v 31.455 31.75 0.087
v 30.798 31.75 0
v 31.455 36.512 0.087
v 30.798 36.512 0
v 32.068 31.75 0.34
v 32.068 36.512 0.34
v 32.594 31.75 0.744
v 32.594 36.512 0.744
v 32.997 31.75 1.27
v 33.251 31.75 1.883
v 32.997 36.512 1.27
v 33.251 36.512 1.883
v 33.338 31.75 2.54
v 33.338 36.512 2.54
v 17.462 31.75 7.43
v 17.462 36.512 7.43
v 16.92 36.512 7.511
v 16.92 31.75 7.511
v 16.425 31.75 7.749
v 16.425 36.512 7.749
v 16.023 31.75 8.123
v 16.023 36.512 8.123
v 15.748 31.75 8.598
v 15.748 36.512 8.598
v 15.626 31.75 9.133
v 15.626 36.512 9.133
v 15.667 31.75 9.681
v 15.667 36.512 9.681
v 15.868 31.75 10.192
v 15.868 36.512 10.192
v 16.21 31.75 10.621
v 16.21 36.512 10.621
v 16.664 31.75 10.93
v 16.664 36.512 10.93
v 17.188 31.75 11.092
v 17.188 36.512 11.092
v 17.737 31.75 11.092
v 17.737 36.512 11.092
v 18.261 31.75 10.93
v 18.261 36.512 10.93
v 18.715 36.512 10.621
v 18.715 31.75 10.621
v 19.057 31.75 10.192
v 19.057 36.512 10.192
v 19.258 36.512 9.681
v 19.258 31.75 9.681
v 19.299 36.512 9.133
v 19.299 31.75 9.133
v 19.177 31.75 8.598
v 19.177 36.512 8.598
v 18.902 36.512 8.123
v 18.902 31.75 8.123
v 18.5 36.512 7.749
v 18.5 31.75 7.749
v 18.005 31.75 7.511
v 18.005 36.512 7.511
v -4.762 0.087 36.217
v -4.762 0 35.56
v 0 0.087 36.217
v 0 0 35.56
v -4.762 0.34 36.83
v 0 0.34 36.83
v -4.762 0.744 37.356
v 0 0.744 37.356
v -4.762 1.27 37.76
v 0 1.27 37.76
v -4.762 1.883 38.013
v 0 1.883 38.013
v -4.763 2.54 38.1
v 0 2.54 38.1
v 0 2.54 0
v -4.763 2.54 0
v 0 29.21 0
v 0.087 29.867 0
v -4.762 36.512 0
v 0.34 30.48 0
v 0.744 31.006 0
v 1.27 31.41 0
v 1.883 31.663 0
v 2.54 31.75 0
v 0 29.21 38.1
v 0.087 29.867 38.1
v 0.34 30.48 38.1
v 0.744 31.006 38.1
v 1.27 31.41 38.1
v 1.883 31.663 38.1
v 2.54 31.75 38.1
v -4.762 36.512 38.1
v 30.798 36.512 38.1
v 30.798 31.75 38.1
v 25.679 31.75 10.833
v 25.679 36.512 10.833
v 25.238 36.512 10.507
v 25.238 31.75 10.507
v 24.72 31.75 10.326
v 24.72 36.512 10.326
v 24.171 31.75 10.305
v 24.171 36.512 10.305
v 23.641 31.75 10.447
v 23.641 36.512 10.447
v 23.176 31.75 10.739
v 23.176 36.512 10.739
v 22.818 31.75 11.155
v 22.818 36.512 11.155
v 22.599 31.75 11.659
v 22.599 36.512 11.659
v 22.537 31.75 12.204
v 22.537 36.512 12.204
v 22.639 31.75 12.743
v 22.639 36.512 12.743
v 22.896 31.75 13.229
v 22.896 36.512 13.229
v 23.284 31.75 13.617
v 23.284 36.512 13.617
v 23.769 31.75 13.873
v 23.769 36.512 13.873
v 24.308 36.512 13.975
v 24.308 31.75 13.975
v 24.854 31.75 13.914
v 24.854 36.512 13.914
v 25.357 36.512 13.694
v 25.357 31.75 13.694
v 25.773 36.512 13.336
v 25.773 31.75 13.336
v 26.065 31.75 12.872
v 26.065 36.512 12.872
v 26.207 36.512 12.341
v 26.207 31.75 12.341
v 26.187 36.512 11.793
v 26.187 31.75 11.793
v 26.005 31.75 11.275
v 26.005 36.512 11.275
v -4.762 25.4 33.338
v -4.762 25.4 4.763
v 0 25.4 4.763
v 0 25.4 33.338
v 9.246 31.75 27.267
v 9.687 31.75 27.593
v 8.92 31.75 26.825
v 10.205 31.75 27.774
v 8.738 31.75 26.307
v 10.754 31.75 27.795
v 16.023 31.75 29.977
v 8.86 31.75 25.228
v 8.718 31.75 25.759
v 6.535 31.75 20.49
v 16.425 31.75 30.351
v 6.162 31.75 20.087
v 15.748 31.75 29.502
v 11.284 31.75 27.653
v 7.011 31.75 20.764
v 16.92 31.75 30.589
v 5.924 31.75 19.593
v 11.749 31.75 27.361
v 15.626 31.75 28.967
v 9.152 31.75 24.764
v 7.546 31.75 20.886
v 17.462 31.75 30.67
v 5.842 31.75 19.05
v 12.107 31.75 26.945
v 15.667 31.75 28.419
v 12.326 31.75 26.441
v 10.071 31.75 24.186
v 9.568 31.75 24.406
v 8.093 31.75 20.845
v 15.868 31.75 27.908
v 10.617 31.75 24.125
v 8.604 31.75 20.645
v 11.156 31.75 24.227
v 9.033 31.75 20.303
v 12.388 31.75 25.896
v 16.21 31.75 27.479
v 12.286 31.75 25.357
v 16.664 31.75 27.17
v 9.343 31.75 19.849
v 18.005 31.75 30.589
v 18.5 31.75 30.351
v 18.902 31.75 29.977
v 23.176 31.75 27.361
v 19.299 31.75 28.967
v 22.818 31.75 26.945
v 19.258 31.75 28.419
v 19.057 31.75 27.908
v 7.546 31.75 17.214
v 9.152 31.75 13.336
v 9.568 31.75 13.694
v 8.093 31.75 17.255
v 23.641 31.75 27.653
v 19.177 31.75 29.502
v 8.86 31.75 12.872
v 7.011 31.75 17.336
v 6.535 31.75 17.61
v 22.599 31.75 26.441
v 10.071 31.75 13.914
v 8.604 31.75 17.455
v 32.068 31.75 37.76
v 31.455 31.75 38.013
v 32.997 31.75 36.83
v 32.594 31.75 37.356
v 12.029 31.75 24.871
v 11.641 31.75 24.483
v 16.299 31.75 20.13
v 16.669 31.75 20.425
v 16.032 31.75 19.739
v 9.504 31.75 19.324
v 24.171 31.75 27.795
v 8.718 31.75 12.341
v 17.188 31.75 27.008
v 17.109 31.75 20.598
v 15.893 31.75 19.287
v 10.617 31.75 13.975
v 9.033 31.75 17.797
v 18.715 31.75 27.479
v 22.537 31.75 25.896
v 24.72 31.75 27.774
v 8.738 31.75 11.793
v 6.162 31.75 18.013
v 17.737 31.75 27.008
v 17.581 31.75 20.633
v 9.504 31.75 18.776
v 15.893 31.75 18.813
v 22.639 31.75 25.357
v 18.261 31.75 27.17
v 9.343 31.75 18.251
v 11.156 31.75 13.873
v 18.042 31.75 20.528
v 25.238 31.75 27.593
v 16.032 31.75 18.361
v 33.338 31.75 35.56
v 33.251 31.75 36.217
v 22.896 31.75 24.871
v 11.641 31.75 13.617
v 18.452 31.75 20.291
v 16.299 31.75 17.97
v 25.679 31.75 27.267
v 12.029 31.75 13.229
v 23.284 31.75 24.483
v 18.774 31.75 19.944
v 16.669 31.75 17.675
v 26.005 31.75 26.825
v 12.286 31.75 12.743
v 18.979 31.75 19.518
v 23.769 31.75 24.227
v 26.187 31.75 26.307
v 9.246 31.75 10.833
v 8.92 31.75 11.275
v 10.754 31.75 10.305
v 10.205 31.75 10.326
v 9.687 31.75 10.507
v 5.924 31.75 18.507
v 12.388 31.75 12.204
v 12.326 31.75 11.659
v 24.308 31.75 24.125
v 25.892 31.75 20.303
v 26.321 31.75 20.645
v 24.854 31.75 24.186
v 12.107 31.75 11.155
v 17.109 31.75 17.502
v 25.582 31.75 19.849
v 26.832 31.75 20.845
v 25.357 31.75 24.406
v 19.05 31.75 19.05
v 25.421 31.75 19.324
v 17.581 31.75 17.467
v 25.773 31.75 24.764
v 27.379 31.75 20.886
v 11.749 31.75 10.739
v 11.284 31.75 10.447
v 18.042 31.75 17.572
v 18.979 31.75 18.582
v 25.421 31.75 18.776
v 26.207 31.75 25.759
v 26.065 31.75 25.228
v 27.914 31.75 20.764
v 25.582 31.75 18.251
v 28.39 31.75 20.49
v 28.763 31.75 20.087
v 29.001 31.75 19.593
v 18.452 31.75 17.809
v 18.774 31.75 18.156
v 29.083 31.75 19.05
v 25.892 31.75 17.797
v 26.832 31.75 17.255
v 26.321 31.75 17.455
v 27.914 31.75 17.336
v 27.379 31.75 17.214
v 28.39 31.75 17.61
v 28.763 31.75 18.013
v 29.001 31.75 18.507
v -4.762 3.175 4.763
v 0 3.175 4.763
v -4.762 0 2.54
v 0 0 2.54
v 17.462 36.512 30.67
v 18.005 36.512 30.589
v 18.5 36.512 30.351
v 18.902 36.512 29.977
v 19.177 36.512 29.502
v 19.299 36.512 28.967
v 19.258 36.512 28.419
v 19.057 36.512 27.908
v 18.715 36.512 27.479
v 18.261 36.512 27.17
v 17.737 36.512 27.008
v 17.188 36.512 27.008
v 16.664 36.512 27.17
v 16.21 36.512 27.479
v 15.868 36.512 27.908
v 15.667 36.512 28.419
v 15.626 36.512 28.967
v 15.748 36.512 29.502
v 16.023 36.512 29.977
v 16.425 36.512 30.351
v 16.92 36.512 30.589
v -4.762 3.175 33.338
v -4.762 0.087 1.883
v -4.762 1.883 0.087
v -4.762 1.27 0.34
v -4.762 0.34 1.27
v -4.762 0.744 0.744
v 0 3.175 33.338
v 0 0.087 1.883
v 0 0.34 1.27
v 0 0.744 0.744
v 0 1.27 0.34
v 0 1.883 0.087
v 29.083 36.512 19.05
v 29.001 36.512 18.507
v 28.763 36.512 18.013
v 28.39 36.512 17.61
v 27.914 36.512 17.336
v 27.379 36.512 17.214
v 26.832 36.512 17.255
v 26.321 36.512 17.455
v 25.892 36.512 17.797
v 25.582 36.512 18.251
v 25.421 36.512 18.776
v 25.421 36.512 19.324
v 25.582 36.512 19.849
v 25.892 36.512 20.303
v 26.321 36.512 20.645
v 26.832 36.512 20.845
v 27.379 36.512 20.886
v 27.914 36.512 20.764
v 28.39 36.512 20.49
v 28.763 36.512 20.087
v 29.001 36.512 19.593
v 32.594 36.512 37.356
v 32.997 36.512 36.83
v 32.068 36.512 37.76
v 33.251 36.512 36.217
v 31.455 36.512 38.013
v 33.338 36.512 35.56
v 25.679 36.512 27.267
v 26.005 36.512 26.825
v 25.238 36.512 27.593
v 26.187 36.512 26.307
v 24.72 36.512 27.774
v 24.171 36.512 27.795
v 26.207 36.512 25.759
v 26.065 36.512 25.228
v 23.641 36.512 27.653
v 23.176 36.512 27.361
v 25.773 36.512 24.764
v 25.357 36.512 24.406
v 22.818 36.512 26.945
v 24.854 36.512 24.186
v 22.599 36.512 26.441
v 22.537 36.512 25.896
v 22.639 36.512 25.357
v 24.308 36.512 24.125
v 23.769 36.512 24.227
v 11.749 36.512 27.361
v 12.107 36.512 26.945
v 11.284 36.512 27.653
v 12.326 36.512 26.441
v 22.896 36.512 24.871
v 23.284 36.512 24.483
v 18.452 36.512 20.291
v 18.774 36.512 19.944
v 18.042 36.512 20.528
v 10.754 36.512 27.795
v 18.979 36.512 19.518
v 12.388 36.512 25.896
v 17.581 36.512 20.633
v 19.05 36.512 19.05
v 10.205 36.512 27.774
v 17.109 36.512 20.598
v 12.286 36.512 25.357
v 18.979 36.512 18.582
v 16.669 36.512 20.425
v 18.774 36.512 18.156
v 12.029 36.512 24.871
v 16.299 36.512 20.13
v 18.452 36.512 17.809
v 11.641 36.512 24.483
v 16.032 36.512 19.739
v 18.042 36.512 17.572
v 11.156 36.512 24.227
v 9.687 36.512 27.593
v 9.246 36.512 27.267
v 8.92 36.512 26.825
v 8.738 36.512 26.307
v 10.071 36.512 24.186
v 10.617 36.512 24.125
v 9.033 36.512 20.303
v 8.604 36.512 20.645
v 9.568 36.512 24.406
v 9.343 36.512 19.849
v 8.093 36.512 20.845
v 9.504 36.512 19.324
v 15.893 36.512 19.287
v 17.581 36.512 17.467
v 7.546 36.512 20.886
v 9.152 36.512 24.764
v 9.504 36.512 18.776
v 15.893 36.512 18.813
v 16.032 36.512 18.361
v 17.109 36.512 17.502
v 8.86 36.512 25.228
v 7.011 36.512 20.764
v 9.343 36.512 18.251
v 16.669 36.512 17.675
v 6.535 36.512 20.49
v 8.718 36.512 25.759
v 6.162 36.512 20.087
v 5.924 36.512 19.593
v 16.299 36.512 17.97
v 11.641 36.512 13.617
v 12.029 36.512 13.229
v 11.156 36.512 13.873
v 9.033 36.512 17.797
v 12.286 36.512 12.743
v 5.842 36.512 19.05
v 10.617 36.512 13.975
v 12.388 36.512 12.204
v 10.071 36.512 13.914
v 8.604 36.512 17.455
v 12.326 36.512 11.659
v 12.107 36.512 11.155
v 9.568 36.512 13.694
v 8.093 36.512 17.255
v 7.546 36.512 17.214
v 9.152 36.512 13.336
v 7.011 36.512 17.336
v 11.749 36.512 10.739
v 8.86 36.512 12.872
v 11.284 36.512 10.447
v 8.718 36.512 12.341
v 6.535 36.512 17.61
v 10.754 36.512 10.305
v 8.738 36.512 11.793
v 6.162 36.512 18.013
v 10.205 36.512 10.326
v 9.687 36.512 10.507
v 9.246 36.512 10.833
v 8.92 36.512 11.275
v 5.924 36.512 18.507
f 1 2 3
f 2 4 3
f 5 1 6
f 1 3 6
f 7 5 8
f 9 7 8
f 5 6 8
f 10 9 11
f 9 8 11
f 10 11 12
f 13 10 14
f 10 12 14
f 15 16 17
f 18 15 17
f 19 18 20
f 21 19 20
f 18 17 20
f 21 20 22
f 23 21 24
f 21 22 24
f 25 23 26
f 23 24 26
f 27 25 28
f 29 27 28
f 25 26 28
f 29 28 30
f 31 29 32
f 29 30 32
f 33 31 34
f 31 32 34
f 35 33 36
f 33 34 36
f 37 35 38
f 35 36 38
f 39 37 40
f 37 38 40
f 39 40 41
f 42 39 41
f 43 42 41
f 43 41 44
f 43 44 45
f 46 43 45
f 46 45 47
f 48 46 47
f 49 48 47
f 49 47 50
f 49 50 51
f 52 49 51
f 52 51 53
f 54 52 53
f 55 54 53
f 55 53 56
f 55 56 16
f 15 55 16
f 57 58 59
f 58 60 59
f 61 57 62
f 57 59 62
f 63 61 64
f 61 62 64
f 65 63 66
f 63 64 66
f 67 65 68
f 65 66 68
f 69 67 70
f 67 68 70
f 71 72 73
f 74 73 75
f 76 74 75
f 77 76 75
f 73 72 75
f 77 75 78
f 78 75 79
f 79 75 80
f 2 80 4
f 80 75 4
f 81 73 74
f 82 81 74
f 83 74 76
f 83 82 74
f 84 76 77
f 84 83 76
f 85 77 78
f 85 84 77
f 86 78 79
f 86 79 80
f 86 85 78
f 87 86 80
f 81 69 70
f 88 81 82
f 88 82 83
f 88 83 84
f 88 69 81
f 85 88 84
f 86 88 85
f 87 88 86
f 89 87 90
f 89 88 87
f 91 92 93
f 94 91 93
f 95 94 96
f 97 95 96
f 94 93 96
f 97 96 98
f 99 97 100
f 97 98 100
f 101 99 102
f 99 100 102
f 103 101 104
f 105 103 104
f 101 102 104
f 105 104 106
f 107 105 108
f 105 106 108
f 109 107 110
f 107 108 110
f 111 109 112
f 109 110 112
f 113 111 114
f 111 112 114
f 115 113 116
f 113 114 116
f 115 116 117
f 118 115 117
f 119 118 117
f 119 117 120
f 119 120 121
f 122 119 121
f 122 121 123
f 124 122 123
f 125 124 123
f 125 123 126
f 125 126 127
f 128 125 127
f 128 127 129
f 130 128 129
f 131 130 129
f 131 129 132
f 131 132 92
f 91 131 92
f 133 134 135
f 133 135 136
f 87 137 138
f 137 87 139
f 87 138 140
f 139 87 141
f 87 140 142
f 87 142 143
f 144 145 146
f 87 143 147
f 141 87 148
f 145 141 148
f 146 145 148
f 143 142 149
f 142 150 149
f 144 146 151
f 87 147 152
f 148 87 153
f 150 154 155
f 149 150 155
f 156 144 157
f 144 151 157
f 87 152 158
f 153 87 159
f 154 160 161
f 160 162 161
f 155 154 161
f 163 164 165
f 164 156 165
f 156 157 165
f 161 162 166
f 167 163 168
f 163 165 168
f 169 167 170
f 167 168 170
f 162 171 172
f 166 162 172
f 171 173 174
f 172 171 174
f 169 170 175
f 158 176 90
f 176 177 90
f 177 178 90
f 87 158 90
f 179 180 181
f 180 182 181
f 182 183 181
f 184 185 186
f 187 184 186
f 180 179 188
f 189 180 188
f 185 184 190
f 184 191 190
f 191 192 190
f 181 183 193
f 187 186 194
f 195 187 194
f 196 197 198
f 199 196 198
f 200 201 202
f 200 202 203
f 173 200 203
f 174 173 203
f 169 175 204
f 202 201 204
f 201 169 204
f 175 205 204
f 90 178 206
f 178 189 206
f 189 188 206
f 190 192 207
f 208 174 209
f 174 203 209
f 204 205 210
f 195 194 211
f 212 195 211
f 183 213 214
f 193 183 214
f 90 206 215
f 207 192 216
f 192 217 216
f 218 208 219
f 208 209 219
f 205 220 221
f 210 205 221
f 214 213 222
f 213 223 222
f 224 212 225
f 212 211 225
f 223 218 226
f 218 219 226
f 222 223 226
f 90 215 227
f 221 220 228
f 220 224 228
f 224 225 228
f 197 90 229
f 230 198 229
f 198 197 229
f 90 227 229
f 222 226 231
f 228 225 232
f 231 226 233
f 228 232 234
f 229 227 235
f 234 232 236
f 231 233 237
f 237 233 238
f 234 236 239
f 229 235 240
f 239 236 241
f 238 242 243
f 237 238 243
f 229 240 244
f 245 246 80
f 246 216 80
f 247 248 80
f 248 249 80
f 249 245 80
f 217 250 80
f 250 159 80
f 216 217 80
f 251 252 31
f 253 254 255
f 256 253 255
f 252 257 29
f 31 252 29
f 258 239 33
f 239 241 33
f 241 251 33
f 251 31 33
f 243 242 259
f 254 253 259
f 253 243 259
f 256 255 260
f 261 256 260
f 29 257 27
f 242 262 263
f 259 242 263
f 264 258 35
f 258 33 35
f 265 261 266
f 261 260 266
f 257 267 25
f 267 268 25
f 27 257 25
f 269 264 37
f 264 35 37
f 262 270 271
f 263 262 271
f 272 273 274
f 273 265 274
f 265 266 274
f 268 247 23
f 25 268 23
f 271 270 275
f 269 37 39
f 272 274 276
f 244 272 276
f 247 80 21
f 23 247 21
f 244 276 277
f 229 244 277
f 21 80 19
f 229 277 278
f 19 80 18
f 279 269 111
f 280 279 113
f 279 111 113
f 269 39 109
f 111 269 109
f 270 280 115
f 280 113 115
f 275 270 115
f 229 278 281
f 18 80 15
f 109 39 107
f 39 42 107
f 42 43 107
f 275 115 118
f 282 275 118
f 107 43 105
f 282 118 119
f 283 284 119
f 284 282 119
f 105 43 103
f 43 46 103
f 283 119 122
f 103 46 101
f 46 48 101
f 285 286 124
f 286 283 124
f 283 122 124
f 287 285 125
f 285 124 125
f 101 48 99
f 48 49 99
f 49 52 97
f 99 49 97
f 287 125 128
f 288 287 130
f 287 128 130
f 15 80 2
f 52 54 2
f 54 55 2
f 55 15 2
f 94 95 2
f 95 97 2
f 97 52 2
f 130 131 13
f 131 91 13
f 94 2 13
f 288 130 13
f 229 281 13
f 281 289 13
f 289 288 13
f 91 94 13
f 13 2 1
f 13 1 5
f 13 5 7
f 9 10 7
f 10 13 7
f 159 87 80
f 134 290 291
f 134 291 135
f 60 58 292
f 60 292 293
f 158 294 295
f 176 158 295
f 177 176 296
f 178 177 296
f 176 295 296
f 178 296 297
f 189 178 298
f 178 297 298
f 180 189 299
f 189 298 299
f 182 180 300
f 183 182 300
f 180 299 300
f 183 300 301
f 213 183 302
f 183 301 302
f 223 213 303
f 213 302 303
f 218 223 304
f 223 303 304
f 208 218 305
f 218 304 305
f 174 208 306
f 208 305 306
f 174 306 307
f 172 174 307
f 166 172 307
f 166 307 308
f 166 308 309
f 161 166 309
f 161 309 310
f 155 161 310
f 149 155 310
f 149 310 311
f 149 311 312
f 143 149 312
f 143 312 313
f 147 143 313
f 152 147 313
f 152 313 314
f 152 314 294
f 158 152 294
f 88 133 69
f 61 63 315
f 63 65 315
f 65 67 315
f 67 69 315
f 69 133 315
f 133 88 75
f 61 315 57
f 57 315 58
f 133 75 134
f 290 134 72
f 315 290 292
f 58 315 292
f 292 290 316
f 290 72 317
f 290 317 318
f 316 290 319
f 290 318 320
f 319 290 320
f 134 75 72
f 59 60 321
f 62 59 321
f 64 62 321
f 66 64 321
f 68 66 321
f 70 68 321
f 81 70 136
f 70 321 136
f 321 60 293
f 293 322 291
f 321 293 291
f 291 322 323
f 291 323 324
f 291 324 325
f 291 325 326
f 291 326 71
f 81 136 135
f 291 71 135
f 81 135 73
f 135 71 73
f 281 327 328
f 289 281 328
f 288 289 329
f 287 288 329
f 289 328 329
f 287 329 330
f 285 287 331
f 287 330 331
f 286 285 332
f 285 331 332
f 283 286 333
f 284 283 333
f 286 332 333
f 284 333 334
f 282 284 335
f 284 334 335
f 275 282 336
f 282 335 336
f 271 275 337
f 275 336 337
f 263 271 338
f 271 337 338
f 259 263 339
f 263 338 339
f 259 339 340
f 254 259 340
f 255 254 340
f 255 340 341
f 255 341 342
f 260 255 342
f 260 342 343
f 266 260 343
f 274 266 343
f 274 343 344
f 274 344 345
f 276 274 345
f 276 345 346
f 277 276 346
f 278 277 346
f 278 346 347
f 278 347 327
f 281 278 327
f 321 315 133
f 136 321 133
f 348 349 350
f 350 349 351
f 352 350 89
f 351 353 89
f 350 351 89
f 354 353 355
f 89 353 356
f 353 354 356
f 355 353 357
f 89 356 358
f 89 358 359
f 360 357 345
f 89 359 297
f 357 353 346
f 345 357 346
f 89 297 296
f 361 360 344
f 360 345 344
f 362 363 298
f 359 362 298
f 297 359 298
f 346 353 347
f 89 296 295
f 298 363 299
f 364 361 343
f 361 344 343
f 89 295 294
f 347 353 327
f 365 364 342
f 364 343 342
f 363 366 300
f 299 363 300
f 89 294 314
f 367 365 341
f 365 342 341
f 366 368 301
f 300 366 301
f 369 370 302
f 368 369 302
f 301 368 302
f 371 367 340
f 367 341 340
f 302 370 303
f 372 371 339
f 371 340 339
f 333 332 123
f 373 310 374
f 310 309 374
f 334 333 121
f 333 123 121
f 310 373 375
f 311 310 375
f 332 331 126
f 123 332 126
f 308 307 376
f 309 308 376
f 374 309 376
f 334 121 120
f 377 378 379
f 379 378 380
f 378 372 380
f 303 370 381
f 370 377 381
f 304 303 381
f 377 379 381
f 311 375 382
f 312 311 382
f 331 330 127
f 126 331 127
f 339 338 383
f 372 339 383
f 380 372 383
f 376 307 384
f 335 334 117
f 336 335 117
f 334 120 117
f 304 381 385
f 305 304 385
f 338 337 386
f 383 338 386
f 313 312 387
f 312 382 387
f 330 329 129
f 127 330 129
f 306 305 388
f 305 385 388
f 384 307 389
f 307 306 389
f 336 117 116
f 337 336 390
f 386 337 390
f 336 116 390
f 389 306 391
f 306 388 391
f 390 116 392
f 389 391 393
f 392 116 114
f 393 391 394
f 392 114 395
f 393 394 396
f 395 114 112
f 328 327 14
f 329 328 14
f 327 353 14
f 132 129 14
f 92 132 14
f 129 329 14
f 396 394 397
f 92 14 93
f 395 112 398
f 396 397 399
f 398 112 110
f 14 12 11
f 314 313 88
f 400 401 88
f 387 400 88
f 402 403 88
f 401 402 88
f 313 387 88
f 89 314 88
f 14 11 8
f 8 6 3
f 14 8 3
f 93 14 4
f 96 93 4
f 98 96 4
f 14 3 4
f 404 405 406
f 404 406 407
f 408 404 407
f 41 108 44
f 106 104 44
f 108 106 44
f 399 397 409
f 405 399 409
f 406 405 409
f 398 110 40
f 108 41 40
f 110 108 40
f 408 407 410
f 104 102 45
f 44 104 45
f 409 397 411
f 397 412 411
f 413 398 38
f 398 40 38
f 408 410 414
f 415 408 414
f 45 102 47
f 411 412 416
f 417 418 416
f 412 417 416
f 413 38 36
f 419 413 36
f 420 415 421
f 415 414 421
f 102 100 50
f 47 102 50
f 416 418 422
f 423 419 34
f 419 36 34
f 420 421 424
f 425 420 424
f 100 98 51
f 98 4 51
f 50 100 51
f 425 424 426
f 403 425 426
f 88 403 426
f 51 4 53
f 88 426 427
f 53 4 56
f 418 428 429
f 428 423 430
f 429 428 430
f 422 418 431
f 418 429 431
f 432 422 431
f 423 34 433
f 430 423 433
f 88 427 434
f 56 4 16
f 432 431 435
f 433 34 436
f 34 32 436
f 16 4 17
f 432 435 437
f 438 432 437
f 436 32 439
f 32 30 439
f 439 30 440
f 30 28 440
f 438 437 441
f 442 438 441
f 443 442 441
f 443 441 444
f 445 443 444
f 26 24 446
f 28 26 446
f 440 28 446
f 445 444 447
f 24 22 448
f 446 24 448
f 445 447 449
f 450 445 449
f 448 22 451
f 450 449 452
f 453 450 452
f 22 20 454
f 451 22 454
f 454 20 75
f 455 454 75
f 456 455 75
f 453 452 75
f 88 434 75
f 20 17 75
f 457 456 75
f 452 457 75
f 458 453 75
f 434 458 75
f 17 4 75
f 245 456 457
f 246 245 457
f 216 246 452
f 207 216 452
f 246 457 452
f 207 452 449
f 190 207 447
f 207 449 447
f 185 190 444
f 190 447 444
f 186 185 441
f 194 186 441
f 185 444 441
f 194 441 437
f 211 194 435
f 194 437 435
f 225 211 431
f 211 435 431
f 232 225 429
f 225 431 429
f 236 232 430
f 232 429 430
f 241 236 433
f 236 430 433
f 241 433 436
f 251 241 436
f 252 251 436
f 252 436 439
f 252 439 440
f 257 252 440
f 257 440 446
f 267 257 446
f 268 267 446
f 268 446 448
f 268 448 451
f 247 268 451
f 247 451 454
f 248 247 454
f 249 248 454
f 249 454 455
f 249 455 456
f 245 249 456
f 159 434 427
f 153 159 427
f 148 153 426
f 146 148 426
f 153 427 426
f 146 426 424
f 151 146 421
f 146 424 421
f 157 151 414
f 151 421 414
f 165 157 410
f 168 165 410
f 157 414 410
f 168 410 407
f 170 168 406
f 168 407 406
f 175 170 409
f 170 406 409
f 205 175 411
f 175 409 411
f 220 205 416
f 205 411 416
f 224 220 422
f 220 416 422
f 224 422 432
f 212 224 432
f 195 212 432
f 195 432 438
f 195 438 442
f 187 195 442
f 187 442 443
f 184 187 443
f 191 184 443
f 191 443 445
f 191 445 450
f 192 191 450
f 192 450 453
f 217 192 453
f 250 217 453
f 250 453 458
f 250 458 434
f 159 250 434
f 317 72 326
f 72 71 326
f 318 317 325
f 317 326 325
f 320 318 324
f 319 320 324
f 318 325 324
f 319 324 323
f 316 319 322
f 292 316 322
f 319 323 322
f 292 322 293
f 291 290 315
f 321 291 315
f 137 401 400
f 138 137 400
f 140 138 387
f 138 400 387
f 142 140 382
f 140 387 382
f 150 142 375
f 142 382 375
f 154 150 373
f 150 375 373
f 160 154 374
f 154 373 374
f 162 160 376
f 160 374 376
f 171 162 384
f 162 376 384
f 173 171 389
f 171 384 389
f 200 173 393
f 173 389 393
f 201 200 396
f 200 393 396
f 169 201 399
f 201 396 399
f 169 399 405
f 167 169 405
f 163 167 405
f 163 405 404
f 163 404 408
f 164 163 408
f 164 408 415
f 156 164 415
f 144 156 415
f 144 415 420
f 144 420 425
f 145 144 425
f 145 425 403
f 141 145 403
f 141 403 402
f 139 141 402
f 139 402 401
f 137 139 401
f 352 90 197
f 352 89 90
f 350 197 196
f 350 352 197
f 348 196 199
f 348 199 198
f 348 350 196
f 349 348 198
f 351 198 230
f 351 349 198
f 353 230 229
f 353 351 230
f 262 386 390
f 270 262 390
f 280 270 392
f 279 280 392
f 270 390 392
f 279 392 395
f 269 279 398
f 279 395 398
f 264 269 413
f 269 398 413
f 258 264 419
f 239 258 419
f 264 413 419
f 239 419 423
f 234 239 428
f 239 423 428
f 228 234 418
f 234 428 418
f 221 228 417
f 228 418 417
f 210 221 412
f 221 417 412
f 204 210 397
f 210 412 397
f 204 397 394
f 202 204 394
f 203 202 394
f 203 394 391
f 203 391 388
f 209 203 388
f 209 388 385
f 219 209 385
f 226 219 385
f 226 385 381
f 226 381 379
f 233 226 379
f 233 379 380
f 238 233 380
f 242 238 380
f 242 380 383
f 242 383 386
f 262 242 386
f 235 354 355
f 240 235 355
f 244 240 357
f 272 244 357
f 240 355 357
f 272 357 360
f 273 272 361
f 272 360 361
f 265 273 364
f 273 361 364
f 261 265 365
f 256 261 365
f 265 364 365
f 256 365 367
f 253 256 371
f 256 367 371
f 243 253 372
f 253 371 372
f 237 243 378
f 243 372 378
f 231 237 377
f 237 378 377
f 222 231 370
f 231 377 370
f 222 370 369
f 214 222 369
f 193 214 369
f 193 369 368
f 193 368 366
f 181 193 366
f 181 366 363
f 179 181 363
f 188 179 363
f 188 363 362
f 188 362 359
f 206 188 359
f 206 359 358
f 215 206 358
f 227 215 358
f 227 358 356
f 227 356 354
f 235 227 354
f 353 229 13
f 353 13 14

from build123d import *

# Parameters (mm, degrees)
BOSS_EXTRUDE1_DEPTH = 38.1
SKETCH2_W           = 28.575
SKETCH2_H           = 22.225
CUT_EXTRUDE1_DEPTH  = 39.1
SKETCH3_R           = 1.5875
CUT_EXTRUDE2_DEPTH  = 37.5125
SKETCH4_R           = 1.8415
CUT_EXTRUDE3_DEPTH  = 37.5125
CIRPATTERN1_COUNT   = 8
FILLET1_R           = 2.54
FILLET2_R           = 2.54


with BuildPart() as part:
    # Sketch1 → Boss-Extrude1 (new body)
    with BuildSketch(Plane.XY):
        Polygon((0, 0), (0, 31.75), (33.3375, 31.75), (33.3375, 36.5125), (-4.7625, 36.5125), (-4.7625, 0), align=None)
    extrude(amount=BOSS_EXTRUDE1_DEPTH)

    # Sketch2 → Cut-Extrude1 (cut, through all)
    with BuildSketch(Plane.ZY.offset(4.7625)):
        with Locations((19.05, 14.2875)):
            Rectangle(SKETCH2_W, SKETCH2_H)
    extrude(amount=-CUT_EXTRUDE1_DEPTH, mode=Mode.SUBTRACT)

    # Sketch3 → Cut-Extrude2 (cut, through all)
    with BuildSketch(Plane(origin=(0, 36.5125, 0), x_dir=(1, 0, 0), z_dir=(0, 1, 0))):
        with Locations((17.4625, -19.05)):
            Circle(SKETCH3_R)
    extrude(amount=-CUT_EXTRUDE2_DEPTH, mode=Mode.SUBTRACT)

    # Sketch4 → Cut-Extrude3 (cut, through all)
    with BuildSketch(Plane(origin=(0, 36.5125, 0), x_dir=(1, 0, 0), z_dir=(0, 1, 0))):
        with Locations((27.2415, -19.05)):
            Circle(SKETCH4_R)
    cut_extrude3 = extrude(amount=-CUT_EXTRUDE3_DEPTH, mode=Mode.SUBTRACT)

    # CirPattern1: Cut-Extrude3 ×8 about axis
    cirpattern1_axis = Axis((17.4625, 0, 19.05), (0, 1, 0))
    for i in range(1, CIRPATTERN1_COUNT):
        add(cut_extrude3.rotate(cirpattern1_axis, i * 360 / CIRPATTERN1_COUNT), mode=Mode.SUBTRACT)

    # Fillet1
    fillet1_edges = [part.edges().sort_by_distance(p)[0] for p in [
        (0, 31.75, 19.05),
    ]]
    fillet(fillet1_edges, radius=FILLET1_R)

    # Fillet2
    fillet2_edges = [part.edges().sort_by_distance(p)[0] for p in [
        (33.3375, 34.13125, 38.1),
        (-2.38125, 0, 38.1),
        (33.3375, 34.13125, 0),
        (-2.38125, 0, 0),
    ]]
    fillet(fillet2_edges, radius=FILLET2_R)


solid = part.part
